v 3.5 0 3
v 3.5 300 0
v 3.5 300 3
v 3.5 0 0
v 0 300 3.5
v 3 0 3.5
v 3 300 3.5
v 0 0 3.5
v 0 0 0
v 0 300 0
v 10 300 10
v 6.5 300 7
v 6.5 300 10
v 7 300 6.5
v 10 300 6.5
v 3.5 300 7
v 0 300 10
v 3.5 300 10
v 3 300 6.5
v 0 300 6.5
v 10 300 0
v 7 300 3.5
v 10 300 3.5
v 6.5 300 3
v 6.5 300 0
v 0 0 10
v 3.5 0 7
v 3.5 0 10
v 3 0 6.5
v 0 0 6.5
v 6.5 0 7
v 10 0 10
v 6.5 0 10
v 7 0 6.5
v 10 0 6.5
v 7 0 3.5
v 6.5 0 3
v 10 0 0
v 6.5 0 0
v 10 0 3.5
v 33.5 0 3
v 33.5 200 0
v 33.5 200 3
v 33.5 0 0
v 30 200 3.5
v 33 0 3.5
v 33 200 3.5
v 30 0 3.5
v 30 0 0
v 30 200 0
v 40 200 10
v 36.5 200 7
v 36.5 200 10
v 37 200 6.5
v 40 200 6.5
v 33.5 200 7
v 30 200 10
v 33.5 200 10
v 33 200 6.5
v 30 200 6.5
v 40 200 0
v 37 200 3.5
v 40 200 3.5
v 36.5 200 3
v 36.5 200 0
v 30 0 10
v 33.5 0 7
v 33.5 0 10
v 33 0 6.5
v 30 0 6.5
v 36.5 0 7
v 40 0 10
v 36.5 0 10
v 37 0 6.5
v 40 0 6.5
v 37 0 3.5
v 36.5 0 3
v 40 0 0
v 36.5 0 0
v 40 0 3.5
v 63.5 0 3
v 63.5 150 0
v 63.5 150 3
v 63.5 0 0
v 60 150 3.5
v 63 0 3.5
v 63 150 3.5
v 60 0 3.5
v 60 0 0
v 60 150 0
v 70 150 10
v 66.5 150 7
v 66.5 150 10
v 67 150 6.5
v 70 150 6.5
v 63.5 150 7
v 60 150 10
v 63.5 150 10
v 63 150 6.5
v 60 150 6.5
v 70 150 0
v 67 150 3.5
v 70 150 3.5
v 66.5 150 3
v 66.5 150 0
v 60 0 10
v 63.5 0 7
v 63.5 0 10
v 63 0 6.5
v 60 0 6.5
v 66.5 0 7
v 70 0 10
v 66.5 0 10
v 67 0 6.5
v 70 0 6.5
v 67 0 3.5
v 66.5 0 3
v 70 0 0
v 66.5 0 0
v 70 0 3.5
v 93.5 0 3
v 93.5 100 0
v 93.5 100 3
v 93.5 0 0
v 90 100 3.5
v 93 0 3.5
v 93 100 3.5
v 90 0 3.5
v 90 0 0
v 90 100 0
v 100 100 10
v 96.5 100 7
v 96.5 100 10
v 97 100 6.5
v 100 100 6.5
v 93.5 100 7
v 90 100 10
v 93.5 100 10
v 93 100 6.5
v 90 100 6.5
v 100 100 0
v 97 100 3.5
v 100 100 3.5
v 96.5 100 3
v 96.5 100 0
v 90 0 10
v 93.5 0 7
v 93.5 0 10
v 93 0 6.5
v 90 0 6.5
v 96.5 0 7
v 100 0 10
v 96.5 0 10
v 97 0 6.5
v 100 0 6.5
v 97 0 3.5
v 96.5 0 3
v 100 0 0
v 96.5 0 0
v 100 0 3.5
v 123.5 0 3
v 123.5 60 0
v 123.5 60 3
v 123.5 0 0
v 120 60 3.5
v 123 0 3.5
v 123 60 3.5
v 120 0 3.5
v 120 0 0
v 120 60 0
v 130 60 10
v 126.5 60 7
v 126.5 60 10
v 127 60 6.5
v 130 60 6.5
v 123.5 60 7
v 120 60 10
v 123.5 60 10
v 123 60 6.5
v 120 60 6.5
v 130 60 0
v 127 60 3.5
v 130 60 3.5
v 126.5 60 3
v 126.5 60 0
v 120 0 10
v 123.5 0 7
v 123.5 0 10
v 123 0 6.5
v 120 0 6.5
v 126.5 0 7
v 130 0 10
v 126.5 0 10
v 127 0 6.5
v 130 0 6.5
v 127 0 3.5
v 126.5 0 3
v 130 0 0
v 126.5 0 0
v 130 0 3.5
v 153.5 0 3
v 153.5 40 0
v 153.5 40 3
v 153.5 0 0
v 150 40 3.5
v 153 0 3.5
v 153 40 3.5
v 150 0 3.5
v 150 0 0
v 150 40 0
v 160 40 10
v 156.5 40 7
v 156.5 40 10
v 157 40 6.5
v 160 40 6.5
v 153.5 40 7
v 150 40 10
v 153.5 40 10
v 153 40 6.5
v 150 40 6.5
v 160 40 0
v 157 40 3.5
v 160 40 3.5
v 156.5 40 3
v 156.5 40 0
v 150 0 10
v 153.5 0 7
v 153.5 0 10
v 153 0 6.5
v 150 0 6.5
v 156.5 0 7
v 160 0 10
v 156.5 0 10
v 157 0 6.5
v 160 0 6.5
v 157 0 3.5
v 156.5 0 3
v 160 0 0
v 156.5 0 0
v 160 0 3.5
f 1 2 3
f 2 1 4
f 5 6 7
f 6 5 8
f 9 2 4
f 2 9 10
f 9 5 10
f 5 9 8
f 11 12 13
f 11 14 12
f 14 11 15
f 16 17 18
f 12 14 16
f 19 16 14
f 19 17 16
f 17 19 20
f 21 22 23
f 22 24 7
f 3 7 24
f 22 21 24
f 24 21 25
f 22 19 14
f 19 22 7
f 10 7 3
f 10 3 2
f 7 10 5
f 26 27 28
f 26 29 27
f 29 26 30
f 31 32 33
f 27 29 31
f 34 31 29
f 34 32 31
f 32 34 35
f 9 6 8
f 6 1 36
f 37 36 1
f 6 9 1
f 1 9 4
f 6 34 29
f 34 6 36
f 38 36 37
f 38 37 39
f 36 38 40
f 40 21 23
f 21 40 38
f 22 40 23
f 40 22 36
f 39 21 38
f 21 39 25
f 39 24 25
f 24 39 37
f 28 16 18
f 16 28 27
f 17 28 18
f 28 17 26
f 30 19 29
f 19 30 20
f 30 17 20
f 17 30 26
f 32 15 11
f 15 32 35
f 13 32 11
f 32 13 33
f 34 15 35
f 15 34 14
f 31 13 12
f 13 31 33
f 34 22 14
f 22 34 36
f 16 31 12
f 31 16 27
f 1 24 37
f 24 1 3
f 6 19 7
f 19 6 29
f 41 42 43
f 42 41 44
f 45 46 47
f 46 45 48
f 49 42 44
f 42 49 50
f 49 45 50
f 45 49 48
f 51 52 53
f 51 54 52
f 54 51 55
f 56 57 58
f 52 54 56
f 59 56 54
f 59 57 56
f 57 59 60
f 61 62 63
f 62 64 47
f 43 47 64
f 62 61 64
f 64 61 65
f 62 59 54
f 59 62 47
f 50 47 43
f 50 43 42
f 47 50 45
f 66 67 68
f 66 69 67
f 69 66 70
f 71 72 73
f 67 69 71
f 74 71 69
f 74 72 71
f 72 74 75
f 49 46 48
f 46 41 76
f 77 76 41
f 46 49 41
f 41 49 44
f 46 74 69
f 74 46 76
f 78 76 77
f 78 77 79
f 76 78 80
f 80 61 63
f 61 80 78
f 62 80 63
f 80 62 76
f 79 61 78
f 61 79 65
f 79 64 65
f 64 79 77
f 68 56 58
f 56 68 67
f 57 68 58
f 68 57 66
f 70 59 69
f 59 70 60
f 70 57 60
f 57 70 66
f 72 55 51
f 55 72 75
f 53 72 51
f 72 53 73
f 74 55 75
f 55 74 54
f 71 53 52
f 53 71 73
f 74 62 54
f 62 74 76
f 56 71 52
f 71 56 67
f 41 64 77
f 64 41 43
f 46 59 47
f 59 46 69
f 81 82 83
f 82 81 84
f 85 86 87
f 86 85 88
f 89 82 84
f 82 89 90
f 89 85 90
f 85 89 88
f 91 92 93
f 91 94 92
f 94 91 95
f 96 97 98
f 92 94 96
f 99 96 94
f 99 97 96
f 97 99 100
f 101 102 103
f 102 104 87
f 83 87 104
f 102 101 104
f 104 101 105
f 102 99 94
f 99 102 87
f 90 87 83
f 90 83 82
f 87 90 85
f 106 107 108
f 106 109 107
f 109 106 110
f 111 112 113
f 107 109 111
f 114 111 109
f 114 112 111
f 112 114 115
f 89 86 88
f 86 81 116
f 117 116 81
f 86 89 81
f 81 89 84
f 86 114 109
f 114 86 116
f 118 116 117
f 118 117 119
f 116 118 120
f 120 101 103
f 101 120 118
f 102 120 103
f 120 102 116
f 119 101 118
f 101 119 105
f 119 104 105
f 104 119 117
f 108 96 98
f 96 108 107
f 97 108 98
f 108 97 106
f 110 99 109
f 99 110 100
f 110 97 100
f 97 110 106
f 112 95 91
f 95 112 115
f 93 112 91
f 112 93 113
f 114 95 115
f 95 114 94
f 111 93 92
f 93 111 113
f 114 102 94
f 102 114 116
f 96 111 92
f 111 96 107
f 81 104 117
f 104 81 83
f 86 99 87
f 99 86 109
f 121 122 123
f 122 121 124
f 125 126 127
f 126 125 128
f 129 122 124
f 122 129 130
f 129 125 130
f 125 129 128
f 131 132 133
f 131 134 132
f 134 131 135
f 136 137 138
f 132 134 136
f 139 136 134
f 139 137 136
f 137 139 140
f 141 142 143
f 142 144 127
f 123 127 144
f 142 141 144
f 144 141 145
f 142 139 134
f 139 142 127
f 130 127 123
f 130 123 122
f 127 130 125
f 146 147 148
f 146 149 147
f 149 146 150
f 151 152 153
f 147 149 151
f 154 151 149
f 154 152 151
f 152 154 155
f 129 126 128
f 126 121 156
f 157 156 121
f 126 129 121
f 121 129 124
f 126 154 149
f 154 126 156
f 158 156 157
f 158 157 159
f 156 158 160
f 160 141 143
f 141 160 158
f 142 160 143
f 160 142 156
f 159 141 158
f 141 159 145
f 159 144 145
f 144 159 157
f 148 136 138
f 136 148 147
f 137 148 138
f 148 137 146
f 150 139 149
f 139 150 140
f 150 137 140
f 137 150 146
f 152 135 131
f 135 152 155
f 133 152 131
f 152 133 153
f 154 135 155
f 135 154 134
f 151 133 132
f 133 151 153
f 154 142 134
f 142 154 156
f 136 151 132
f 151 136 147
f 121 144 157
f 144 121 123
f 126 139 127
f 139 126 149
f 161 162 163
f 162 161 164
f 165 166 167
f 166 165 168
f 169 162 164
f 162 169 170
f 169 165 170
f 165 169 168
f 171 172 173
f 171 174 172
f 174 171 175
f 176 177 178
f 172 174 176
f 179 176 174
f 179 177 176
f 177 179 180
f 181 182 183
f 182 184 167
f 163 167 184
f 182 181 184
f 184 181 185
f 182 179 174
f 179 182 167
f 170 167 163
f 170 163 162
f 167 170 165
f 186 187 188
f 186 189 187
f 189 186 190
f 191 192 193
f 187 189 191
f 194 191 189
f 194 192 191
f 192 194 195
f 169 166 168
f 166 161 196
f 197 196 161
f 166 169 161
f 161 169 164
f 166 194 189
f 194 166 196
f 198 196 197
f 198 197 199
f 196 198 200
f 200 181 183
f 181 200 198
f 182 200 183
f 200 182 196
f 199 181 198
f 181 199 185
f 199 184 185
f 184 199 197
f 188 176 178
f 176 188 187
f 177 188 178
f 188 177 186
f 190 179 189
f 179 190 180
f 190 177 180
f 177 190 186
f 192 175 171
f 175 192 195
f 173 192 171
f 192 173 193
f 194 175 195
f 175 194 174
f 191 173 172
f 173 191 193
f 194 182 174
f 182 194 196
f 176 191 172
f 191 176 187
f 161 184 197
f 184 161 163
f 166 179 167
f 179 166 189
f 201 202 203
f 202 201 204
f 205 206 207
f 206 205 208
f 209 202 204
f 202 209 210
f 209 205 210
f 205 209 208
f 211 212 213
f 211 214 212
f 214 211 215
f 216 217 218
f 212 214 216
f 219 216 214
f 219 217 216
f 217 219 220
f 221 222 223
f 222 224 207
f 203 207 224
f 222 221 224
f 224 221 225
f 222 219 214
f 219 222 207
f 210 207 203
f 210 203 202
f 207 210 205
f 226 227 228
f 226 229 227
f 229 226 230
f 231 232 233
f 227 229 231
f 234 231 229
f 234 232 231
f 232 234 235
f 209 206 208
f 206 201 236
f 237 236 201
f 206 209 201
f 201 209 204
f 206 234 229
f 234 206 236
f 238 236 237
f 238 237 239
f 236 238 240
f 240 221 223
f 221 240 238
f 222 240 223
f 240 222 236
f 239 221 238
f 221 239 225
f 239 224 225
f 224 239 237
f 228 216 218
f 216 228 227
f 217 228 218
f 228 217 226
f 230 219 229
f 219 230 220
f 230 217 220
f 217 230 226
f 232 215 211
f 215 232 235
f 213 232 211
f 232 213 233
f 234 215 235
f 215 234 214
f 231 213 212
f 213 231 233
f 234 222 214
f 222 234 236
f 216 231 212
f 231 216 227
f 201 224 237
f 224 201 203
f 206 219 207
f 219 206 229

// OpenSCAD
// file: ../config.scad
//Display helpers
function only_show_printable() = false;
function enabled_materials_filter() = [
    "PLA",
    "PETG",
    "Nylon"
];

//Bearings
function LM8UU_Pressure_Fit_Extra_Diameter() = 0.3;

//Smooth rods
function Rod_Pressure_Fit_Extra_Diameter() = 0.5;

//X Axis
function X_Axis_Rod_Separation() = 34;                          // Distance between rods
function X_Axis_Carriage_Rod_Vertical_Space() = 4;              // Distance between rods and the bearings they rest on
function X_Axis_Carriage_Mid_Bearing_Surround() = 3;            // Amount of plastic around the bearing (in the mid part of the carriage)
function X_Axis_Carriage_Rod_Surround_Extra_Diameter() = 12;    //Amount of plastic around the rods attaching them to the carriage
function X_Axis_Carriage_Screw_Guide_Diameter() = 10;
function X_Axis_Carriage_Screw_Hole_Diameter() = 3.7;
function X_Axis_Carriage_Screw_Hole_Z_Offset() = 2.5;
function X_Axis_Carriage_Bottom_Screw_Hole_Z_Offset() = -1;
function X_Axis_Carriage_Bottom_Screw_Hole_X_Offset() = 4;
function X_Axis_Carriage_Idler_Extra_Diameter() = 2;            //Extra space to put around the idlers
function X_Axis_Carriage_Idler_Extra_Height() = 1;              //Extra space to put above and below idlers
function X_Axis_Carriage_Idler_Vertical_Separation() = 0.5;     //Vertical space between the two idlers
function X_Axis_Carriage_Inner_Extra_Height() = 4;
function X_Axis_Belt_Hole_Extra_Clearance() = 3;

//Y Axis


//Carriage
function Carriage_Bearing_Separation() = 1;                     // Distance between bearings on the carriage (along rods)
function Carriage_Clamp_Reduce_Length() = 1;                    // How much shorter is the hotend clamp than the length of the carriage
function Carriage_Clamp_Hotend_Fix_Extra_Diameter() = 0.1;      // How much extra diameter to allow inside the hotend clamp
function Carriage_Concealed_Nut_Head_Depth() = 1.75;            // Depth of the hole for the bolt head/nut concealed beneath the carriage bearings

function Hotend_Retainer_Extra_Diameter() = 2.5;       // Diameter of the retaining ring around the hotend mounting point
function Hotend_Retainer_Guide_Diameter() = 2;         // Diameter of the 4 guides on the hotend retainer
function Hotend_Retainer_Pressfit_Extra_Diameter() = 0.15;  //Extra diameter to allow for the pressure fit of the hotend retainer
// file: ../materials.scad
use <config.scad>;

module printed(material) {

    module if_enabled_material(enabled_materials, query, index) {
        if (enabled_materials[index] == query) {
            children();
        } else {
            if (index < len(enabled_materials)) {
                if_enabled_material(enabled_materials, query, index + 1) children();
            }
        }
    }

    if_enabled_material(enabled_materials_filter(), material, 0)
        children();
}
module not_printed() {
    if (!only_show_printable())
        children();
}

module metal(color = "silver") {
    not_printed() color(color) children();
}

module jitter_color(c) {
    amount = 0.065;
    d = [
        min(1, max(0, c[0] + rands(-amount,amount,1)[0])),
        min(1, max(0, c[1] + rands(-amount,amount,1)[0])),
        min(1, max(0, c[2] + rands(-amount,amount,1)[0]))
    ];
    color(d) children();
}

module brass() {
    not_printed() jitter_color([181 / 255, 166 / 255, 66 / 255]) children();
}

module PLA() {
    printed("PLA") color(color("cornflowerblue")) children();
}

module PETG() {
    printed("PETG") jitter_color([57 / 255, 255 / 255, 11 / 255, 1]) children();
}

module nylon() {
    printed("Nylon") jitter_color(color("grey")) children();
}
// main file
use <../materials.scad>

module makerbeam_300() {
    makerbeam(300);
}

module makerbeam_200() {
    makerbeam(200);
}

module makerbeam_150() {
    makerbeam(150);
}

module makerbeam_100() {
    makerbeam(100);
}

module makerbeam_60() {
    makerbeam(60);
}

module makerbeam_40() {
    makerbeam(40);
}

module makerbeam(length) {
    x = 10;
    y = length;
    z = 10;
    gap = 3;
    corner = (x - gap) / 2;
    metal("DimGray") {
        translate([0, 0, 0])
            cube([corner, y, corner]);

        translate([corner + gap, 0, 0])
            cube([corner, y, corner]);

        translate([0, 0, corner + gap])
            cube([corner, y, corner]);

        translate([corner + gap, 0, corner + gap])
            cube([corner, y, corner]);

        translate([3, 0, 3])
            cube([4, y, 4]);
    }
}

module demo() {
    makerbeam_300();

    translate([30, 0, 0])
        makerbeam_200();

    translate([60, 0, 0])
        makerbeam_150();

    translate([90, 0, 0])
        makerbeam_100();

    translate([120, 0, 0])
        makerbeam_60();

    translate([150, 0, 0])
        makerbeam_40();
}

demo();
